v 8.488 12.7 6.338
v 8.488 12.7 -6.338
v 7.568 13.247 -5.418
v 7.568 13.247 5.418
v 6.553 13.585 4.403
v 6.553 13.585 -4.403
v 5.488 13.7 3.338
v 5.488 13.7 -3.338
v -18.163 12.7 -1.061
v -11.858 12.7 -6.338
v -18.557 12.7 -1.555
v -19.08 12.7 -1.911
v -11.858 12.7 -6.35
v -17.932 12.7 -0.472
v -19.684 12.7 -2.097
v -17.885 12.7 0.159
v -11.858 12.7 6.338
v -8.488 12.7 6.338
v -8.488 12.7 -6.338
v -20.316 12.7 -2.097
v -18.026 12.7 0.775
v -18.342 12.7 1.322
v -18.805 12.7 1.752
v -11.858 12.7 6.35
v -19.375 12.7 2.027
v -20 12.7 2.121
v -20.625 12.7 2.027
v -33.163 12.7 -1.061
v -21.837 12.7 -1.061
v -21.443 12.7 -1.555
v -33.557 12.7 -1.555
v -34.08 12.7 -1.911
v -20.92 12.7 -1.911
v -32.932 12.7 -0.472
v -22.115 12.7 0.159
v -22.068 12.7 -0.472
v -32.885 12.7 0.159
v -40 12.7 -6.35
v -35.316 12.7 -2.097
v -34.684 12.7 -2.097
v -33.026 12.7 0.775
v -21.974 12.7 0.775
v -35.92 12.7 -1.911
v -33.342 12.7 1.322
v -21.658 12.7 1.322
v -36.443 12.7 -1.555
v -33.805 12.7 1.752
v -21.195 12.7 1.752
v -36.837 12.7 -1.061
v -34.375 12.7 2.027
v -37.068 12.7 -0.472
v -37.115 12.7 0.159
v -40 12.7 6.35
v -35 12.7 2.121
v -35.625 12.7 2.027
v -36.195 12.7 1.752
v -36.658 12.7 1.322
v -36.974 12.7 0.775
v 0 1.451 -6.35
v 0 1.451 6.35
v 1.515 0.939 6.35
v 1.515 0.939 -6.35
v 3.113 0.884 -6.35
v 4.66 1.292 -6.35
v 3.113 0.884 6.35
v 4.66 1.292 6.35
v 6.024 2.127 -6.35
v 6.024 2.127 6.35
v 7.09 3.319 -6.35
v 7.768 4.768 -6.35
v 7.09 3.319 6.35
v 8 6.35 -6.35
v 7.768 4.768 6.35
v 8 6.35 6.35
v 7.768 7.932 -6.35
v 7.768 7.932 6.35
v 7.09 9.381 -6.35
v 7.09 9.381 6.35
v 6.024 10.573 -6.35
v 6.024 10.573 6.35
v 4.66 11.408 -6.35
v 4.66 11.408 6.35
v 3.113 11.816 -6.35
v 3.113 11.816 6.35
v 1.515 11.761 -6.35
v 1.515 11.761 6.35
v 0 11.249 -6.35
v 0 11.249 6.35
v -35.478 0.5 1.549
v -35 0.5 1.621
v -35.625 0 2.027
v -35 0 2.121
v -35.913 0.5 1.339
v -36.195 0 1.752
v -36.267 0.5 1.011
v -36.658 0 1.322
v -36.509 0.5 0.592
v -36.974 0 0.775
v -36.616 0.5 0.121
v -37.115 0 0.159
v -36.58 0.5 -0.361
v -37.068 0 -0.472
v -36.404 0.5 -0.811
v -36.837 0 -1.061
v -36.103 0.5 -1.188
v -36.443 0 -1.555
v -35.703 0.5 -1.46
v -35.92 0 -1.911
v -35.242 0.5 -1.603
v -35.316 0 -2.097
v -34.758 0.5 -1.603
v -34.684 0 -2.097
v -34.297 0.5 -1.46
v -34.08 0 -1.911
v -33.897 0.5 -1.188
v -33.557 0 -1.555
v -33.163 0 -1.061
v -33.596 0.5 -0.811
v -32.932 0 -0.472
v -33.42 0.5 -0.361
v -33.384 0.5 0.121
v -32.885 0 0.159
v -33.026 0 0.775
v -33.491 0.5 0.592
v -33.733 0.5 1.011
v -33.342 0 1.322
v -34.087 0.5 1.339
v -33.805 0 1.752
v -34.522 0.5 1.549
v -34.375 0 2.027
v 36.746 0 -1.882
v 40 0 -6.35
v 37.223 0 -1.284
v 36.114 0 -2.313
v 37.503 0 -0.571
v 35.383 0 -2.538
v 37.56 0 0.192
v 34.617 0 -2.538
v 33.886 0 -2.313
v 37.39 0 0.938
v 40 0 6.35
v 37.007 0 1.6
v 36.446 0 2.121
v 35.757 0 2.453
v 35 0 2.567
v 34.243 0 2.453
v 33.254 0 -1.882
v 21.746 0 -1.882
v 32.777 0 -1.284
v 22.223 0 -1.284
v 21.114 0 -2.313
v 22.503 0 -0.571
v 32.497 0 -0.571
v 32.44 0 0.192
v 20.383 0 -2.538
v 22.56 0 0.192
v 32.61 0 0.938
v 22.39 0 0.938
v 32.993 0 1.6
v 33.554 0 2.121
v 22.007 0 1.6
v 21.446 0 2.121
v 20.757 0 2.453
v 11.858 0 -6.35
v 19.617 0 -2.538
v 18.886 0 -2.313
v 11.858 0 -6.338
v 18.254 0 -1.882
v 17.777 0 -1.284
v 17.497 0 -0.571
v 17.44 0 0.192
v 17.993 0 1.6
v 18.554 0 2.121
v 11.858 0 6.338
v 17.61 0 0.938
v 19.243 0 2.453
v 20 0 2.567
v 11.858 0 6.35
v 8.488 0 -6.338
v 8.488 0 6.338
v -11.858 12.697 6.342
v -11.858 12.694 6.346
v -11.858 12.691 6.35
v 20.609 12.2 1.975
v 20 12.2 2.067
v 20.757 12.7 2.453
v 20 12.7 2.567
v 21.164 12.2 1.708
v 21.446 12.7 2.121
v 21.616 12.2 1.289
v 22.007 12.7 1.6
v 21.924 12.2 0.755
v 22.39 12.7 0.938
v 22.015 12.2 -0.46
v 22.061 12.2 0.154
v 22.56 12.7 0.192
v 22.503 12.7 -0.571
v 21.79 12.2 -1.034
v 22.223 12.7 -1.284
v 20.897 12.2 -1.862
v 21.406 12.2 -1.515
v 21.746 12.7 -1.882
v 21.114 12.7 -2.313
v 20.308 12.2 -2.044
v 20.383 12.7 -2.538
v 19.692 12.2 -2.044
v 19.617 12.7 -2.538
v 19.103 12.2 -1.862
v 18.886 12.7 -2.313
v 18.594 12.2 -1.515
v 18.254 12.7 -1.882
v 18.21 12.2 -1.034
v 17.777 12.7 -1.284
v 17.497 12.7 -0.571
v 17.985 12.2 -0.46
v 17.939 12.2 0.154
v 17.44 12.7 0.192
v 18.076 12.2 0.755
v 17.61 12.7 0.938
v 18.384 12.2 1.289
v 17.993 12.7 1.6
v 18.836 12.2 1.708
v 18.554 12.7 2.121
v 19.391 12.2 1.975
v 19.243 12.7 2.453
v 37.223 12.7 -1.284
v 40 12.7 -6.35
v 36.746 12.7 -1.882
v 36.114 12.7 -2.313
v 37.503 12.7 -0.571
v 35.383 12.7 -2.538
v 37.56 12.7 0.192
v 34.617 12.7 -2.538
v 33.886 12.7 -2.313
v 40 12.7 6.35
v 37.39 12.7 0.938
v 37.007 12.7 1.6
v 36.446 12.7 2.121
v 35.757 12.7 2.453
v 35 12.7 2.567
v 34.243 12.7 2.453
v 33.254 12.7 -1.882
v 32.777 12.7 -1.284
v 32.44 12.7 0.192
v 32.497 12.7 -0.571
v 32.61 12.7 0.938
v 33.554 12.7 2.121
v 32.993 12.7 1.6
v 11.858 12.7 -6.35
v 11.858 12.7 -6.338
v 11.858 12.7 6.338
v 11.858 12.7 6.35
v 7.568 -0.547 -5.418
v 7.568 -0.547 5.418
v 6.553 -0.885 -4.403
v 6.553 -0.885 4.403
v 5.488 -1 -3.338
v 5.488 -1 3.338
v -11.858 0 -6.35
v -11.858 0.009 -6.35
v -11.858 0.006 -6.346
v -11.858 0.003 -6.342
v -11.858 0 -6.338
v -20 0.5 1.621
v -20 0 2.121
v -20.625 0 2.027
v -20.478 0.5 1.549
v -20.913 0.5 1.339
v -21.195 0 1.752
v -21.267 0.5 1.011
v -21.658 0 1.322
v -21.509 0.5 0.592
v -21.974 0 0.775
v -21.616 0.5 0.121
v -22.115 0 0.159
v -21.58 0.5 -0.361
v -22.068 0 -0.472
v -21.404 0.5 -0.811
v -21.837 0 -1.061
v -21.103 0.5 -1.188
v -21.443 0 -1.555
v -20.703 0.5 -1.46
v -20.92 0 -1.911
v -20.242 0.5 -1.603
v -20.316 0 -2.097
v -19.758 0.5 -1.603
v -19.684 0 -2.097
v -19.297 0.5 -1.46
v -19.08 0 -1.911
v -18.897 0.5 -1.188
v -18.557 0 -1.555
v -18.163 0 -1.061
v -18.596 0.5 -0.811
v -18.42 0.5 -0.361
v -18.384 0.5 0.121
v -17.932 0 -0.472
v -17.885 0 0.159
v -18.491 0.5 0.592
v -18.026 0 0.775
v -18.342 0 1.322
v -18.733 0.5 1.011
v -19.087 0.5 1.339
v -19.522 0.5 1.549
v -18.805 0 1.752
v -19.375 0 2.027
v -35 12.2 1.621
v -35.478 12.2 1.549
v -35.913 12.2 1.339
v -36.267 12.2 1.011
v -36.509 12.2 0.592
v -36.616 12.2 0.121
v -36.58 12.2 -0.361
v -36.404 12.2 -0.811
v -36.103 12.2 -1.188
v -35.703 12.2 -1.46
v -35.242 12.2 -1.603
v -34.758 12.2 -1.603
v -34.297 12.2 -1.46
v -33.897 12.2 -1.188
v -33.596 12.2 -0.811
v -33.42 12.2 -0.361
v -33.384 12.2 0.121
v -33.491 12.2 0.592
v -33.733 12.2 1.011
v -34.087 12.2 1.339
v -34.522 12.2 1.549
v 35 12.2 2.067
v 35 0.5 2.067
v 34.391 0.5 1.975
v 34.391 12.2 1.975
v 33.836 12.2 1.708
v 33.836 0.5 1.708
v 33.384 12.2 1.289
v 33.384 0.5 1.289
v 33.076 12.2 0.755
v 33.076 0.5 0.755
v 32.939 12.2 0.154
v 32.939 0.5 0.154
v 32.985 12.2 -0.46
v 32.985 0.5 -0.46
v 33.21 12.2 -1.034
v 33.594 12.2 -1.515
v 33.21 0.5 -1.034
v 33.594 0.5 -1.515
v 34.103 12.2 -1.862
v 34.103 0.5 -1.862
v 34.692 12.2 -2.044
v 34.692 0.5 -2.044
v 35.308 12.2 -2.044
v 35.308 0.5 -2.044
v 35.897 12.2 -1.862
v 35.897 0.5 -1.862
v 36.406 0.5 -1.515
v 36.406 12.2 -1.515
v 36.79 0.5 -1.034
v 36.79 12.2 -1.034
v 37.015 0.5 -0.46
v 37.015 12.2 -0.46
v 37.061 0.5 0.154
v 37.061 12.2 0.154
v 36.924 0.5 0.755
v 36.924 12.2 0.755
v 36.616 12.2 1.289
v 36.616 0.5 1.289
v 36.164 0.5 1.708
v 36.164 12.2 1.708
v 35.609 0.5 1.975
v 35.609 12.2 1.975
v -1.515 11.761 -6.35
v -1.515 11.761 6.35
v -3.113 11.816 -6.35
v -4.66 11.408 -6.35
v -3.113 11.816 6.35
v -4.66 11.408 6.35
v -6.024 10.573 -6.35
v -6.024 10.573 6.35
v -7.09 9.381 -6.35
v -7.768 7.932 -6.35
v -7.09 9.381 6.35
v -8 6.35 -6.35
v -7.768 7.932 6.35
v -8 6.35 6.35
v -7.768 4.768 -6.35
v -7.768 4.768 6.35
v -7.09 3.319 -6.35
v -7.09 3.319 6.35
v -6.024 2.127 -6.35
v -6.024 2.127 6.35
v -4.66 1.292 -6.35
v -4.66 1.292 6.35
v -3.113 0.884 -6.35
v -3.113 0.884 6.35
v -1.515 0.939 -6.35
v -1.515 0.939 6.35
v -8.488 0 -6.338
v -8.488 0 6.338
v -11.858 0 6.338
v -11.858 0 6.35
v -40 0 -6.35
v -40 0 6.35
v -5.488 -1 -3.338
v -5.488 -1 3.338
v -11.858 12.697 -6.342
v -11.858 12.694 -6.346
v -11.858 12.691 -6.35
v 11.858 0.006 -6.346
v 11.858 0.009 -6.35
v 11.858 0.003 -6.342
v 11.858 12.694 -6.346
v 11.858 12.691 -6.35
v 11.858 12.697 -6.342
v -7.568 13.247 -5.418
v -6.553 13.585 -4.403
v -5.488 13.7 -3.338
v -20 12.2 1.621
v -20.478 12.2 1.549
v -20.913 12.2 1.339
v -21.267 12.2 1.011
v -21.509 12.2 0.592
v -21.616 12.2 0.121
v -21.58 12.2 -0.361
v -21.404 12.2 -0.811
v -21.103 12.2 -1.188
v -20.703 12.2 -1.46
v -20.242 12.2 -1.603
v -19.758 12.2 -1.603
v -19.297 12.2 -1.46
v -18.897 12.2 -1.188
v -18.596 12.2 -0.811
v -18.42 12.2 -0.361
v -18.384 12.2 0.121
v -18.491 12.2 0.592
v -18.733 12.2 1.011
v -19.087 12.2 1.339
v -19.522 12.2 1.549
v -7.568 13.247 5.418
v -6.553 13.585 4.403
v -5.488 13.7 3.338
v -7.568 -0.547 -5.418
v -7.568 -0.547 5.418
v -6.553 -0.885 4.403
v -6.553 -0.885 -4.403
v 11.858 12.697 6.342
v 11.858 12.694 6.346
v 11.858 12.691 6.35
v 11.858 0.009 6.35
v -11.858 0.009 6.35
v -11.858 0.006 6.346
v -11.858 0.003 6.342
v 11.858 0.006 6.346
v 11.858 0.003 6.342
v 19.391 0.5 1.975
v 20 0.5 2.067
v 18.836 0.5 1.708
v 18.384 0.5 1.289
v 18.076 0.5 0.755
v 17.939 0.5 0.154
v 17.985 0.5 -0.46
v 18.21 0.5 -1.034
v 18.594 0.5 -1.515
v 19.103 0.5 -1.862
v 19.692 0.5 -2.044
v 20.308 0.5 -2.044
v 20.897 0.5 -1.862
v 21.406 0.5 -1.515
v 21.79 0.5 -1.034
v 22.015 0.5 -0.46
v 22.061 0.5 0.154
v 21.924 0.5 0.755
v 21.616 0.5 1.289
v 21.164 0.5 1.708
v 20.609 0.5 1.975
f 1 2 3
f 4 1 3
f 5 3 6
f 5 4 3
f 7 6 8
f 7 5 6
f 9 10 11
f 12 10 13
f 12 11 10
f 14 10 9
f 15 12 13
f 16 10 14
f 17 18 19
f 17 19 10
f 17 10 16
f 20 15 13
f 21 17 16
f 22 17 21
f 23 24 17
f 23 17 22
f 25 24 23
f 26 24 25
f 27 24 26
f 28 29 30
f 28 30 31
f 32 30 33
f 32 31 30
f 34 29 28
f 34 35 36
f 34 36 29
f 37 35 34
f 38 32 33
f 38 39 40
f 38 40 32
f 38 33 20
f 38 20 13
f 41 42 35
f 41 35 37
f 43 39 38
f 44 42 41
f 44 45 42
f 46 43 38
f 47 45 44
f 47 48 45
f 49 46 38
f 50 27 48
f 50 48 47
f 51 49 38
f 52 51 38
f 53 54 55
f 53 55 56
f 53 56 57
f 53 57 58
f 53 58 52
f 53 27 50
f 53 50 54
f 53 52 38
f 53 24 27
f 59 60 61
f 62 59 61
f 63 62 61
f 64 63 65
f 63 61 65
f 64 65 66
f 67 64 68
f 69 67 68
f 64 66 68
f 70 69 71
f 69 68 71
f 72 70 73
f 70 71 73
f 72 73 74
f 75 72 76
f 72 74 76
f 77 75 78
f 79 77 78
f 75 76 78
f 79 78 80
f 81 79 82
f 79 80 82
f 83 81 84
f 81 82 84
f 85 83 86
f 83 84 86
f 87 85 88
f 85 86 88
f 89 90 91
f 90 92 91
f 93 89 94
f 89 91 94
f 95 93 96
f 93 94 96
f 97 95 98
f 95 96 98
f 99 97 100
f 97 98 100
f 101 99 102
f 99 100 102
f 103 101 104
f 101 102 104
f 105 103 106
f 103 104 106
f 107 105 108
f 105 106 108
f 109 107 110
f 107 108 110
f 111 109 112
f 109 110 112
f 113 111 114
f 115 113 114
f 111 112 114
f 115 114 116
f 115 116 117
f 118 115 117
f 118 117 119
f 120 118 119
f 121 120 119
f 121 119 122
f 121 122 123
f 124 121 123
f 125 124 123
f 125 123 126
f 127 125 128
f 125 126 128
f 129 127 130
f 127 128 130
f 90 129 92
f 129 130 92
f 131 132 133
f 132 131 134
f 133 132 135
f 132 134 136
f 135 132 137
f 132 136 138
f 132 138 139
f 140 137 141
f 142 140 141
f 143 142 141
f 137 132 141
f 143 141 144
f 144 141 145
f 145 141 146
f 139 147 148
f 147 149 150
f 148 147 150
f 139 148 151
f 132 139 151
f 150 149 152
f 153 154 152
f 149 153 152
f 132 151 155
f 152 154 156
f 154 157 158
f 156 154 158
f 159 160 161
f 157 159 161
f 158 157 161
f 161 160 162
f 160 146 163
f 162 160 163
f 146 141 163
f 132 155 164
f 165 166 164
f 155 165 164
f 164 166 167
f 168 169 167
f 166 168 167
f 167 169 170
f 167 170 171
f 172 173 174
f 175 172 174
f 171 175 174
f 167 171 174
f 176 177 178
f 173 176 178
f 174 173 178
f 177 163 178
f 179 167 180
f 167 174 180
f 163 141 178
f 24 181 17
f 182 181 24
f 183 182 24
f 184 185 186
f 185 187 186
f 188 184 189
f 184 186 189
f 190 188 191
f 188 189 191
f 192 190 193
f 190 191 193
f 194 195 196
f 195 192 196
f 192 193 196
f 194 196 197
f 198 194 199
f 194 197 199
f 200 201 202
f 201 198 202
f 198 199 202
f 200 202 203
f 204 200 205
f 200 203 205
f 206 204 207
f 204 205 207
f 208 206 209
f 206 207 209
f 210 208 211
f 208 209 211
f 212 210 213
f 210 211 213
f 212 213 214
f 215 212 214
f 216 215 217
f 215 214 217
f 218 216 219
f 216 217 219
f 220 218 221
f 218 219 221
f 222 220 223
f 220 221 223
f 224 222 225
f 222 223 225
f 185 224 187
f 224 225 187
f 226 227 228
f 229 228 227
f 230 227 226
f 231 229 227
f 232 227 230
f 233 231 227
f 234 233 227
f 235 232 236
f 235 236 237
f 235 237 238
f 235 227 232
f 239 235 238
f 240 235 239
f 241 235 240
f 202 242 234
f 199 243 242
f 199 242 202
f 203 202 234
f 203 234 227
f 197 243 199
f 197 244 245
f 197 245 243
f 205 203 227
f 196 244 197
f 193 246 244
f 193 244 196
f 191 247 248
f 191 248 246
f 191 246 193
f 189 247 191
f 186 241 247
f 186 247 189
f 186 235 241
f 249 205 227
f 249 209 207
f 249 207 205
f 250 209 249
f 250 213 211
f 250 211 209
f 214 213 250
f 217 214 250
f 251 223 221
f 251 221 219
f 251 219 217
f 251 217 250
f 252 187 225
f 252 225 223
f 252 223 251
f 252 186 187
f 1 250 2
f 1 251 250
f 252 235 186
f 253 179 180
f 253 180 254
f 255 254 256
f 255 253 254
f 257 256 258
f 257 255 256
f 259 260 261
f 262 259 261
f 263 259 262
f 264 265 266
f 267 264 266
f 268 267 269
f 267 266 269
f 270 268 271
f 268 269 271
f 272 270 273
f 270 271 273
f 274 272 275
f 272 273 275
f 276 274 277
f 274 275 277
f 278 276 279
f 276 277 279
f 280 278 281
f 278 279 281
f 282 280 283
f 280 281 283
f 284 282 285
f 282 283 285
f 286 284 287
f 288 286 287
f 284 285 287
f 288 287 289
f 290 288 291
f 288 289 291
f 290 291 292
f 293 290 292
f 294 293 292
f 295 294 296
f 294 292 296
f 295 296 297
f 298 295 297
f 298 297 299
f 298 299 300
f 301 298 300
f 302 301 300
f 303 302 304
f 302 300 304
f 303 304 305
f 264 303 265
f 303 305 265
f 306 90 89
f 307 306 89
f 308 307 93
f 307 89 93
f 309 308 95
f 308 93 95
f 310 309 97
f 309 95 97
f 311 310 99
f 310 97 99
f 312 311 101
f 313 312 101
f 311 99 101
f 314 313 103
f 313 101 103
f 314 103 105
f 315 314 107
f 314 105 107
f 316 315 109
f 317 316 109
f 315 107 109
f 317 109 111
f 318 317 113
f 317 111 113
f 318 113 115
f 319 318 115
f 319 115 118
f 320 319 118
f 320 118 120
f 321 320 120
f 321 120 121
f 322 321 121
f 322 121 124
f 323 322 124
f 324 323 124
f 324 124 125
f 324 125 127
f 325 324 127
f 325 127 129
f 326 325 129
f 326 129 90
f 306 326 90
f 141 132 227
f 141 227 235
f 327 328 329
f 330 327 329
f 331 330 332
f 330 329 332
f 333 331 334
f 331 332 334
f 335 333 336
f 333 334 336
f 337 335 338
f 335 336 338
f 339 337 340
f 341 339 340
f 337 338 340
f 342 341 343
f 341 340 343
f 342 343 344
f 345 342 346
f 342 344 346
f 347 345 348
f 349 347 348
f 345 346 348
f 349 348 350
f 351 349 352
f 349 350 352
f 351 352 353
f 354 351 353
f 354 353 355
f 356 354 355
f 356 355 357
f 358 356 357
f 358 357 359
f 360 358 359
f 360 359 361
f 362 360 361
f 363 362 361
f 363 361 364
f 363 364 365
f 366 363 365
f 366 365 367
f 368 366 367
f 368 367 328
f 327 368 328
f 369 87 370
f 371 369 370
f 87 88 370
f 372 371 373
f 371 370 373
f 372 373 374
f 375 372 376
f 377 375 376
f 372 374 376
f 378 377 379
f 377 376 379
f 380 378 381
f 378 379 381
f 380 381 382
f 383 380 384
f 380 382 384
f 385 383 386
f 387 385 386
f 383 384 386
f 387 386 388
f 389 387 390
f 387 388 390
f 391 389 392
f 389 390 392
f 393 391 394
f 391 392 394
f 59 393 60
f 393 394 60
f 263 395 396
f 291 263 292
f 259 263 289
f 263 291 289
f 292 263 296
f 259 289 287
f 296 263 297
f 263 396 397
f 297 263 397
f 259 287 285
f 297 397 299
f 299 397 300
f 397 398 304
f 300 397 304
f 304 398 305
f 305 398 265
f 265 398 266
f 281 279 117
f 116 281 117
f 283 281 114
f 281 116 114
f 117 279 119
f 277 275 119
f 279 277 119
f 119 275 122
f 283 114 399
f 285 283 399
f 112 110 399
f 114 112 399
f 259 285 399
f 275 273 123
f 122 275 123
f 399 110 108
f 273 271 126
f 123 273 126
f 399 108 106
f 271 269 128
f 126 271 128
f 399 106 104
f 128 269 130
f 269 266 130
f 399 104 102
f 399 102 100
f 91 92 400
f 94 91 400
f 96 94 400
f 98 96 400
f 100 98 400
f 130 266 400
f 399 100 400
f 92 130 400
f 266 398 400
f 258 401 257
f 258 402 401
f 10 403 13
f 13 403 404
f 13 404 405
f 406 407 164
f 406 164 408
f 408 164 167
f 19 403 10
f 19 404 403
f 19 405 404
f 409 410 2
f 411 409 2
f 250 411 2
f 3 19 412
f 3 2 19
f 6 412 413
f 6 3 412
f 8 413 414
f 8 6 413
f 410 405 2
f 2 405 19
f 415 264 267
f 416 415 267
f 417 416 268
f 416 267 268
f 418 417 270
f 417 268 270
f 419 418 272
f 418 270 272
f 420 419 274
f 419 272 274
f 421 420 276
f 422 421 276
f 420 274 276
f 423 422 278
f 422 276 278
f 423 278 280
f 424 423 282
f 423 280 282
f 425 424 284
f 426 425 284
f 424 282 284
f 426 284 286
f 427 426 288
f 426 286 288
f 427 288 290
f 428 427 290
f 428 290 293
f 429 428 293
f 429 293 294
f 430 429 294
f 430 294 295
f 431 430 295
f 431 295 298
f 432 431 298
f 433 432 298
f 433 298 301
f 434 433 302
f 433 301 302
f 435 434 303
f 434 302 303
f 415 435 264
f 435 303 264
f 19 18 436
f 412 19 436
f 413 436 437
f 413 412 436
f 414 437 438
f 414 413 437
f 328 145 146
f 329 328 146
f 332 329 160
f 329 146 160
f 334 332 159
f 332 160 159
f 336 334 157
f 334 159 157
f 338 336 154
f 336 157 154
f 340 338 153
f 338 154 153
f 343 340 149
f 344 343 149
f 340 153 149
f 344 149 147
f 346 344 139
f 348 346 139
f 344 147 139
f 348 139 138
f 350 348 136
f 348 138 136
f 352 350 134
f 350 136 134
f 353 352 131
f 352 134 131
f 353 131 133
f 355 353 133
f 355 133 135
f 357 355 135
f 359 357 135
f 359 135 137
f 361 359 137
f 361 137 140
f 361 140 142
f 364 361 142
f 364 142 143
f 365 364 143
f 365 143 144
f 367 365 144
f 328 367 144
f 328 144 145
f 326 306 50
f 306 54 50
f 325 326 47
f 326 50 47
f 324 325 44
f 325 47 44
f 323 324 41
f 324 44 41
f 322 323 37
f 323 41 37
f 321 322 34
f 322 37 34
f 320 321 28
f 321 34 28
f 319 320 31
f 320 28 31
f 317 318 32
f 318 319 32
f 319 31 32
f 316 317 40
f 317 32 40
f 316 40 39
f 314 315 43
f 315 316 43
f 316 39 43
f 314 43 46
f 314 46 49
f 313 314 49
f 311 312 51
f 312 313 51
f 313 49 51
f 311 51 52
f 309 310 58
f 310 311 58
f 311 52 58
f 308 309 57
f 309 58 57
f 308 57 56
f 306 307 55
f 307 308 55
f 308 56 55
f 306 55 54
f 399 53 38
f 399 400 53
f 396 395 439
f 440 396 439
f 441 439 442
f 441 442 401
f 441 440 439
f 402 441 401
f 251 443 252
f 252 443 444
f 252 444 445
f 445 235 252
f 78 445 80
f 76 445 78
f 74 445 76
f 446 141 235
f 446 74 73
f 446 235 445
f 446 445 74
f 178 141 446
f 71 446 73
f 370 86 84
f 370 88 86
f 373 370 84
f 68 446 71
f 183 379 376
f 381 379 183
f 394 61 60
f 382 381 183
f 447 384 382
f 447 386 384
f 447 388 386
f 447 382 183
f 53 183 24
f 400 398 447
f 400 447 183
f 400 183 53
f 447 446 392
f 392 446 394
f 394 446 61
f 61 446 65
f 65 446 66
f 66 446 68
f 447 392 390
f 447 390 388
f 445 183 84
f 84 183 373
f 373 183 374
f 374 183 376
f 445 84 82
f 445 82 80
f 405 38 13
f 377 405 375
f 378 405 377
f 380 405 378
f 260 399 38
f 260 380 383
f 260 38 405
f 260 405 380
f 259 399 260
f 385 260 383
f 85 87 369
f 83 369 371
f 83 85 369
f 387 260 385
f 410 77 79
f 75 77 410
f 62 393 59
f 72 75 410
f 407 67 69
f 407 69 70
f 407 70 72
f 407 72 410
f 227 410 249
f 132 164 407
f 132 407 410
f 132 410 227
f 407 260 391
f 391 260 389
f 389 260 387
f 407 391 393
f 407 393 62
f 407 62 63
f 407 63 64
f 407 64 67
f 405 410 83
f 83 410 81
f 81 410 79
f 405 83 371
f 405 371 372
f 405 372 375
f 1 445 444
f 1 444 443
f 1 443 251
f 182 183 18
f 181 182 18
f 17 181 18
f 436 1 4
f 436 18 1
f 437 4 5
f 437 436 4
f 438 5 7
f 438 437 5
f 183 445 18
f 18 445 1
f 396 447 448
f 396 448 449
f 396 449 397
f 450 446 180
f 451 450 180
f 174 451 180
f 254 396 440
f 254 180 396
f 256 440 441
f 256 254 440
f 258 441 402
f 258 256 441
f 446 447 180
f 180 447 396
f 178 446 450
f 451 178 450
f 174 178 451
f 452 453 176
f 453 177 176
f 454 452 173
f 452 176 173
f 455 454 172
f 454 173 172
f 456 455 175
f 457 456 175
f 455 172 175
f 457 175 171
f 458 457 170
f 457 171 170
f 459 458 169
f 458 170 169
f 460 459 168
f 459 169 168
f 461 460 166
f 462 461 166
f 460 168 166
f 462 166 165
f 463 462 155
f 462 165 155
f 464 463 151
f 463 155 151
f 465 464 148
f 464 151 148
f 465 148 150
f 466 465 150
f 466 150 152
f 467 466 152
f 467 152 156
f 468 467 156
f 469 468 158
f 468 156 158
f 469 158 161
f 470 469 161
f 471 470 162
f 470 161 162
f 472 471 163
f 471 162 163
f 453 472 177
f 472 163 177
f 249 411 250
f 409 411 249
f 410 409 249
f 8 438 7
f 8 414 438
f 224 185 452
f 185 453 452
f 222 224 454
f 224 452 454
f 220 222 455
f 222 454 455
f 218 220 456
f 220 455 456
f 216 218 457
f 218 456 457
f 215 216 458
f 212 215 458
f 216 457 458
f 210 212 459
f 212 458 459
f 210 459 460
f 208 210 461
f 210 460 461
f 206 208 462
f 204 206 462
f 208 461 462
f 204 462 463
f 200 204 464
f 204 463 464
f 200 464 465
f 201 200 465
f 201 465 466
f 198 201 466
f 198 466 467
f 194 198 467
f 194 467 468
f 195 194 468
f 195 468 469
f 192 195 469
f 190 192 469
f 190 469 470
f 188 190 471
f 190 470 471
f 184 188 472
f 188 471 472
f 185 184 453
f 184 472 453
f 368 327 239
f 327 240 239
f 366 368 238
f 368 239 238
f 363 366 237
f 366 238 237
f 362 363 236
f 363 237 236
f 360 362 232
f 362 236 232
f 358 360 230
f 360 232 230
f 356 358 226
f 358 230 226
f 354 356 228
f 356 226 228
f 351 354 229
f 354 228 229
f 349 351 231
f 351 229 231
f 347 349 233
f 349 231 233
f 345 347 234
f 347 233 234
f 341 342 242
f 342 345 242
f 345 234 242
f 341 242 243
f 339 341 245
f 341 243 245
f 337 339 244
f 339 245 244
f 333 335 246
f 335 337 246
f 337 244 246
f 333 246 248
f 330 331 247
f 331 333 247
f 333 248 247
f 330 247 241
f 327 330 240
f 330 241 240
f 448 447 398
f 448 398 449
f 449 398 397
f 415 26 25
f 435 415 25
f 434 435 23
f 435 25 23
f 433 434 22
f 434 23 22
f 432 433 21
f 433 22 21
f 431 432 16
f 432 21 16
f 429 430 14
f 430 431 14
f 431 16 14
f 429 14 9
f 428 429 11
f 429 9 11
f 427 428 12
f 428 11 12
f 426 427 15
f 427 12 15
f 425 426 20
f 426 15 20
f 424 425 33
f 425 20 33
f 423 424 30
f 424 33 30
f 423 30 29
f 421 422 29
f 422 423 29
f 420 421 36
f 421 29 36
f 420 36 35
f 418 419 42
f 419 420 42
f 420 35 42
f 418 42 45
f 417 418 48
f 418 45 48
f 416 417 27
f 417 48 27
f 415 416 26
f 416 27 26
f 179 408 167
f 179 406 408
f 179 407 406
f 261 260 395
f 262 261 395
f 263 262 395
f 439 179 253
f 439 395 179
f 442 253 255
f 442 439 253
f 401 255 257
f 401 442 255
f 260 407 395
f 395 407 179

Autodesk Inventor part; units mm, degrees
ref_plane "YZ Plane" through (0, 0, 0) normal (1, 0, 0) x (0, 1, 0)
ref_plane "XZ Plane" through (0, 0, 0) normal (0, 1, 0) x (-1, 0, 0)
ref_plane "XY Plane" through (0, 0, 0) normal (0, 0, 1) x (1, 0, 0)
sketch "Эскиз1" plane through (0, 0, 0) normal (0, 1, 0) x (-1, 0, 0)
  line L0 (-40, 6.35) -> (40, 6.35)
  line L1 (40, 6.35) -> (40, -6.35)
  line L2 (40, -6.35) -> (-40, -6.35)
  line L3 (-40, -6.35) -> (-40, 6.35)
  line L4 (-40, 6.35) -> (40, -6.35) construction
  line L5 (40, 6.35) -> (-40, -6.35) construction
  point P0 (0, 0)
  dimension "d0" = 80
  dimension "d1" = 12.7
extrude "Выдавливание1" add sketch "Эскиз1" along normal blind 12.7
sketch "Эскиз2" plane through (0, 12.7, 0) normal (0, 1, 0) x (1, 0, 0)
  point P0 (0, 0)
  point P1 (-35, 0)
  point P2 (-20, 0)
  point P3 (20, 0)
  point P4 (35, 0)
  dimension "d4" = 15
  dimension "d5" = 40
  dimension "d6" = 15
  dimension "d7" = 20
hole "Отверстие1" at (-35, 12.7, 0) at (-20, 12.7, 0) direction (0, -1, 0) diameter 3.242 end through all thread size "M4x0.7" class "6H" standard "ISO Metric profile"
hole "Отверстие2" at (20, 12.7, 0) at (35, 12.7, 0) direction (0, -1, 0) diameter 4.134 end through all thread size "M5x0.8" class "6H" standard "ISO Metric profile"
sketch "Эскиз3" plane through (-40, 0, 6.35) normal (0, 0, 1) x (1, 0, 0)
  line L0 (80, 0) -> (0, 0) projected
  arc A0 (40, 11.249) -> (40, 1.451) centre (37.5, 6.35) ccw
  arc A1 (40, 1.451) -> (40, 11.249) centre (42.5, 6.35) ccw
  line L1 (80, 0) -> (80, 12.7) projected
  point P0 (40, 0)
  point P1 (40, 0)
  point P2 (80, 6.35)
  dimension "d22" = 11
  dimension "d23" = 11
  dimension "d24" = 5
extrude "Выдавливание2" cut sketch "Эскиз3" against normal through all
sketch "Эскиз4" plane through (0, 12.7, 0) normal (0, 1, 0) x (1, 0, 0)
  line L0 (40, 6.35) -> (-40, 6.35) projected
  line L1 (-8.5, -6.35) -> (8.5, -6.35)
  line L2 (8.5, -6.35) -> (8.5, 6.35)
  line L3 (8.5, 6.35) -> (-8.5, 6.35)
  line L4 (-8.5, 6.35) -> (-8.5, -6.35)
  line L5 (-8.5, -6.35) -> (8.5, 6.35) construction
  line L6 (8.5, -6.35) -> (-8.5, 6.35) construction
  point P0 (0, 0)
  dimension "d27" = 17
extrude "Выдавливание3" add sketch "Эскиз4" along normal blind 1 draft -50
fillet "Сопряжение1" radius 5 4 edges at (7.3082, 13.7, 0) (0, 13.7, 5.1582) (-7.3082, 13.7, 0) (0, 13.7, -5.1582)
sketch "Эскиз5" plane through (0, 0, 0) normal (0, -1, 0) x (1, 0, 0)
  line L0 (40, 6.35) -> (-40, 6.35) projected
  line L1 (-8.5, -6.35) -> (8.5, -6.35)
  line L2 (8.5, -6.35) -> (8.5, 6.35)
  line L3 (8.5, 6.35) -> (-8.5, 6.35)
  line L4 (-8.5, 6.35) -> (-8.5, -6.35)
  line L5 (-8.5, -6.35) -> (8.5, 6.35) construction
  line L6 (8.5, -6.35) -> (-8.5, 6.35) construction
  point P0 (0, 0)
  dimension "d31" = 17
extrude "Выдавливание4" add sketch "Эскиз5" along normal blind 1 draft -50
fillet "Сопряжение2" radius 5 4 edges at (-7.3082, -1, 0) (0, -1, 5.1582) (7.3082, -1, 0) (0, -1, -5.1582)
chamfer "Фаска1" distance 0.5 angle 45 8 edges at (-35, 12.7, -1.621) (-20, 12.7, -1.621) (20, 12.7, -2.067) (35, 12.7, -2.067) (20, 0, -2.067) (35, 0, -2.067) (-20, 0, -1.621) (-35, 0, -1.621)
properties part number "Weight Sensor" material "Алюминий 6061-AHC"
